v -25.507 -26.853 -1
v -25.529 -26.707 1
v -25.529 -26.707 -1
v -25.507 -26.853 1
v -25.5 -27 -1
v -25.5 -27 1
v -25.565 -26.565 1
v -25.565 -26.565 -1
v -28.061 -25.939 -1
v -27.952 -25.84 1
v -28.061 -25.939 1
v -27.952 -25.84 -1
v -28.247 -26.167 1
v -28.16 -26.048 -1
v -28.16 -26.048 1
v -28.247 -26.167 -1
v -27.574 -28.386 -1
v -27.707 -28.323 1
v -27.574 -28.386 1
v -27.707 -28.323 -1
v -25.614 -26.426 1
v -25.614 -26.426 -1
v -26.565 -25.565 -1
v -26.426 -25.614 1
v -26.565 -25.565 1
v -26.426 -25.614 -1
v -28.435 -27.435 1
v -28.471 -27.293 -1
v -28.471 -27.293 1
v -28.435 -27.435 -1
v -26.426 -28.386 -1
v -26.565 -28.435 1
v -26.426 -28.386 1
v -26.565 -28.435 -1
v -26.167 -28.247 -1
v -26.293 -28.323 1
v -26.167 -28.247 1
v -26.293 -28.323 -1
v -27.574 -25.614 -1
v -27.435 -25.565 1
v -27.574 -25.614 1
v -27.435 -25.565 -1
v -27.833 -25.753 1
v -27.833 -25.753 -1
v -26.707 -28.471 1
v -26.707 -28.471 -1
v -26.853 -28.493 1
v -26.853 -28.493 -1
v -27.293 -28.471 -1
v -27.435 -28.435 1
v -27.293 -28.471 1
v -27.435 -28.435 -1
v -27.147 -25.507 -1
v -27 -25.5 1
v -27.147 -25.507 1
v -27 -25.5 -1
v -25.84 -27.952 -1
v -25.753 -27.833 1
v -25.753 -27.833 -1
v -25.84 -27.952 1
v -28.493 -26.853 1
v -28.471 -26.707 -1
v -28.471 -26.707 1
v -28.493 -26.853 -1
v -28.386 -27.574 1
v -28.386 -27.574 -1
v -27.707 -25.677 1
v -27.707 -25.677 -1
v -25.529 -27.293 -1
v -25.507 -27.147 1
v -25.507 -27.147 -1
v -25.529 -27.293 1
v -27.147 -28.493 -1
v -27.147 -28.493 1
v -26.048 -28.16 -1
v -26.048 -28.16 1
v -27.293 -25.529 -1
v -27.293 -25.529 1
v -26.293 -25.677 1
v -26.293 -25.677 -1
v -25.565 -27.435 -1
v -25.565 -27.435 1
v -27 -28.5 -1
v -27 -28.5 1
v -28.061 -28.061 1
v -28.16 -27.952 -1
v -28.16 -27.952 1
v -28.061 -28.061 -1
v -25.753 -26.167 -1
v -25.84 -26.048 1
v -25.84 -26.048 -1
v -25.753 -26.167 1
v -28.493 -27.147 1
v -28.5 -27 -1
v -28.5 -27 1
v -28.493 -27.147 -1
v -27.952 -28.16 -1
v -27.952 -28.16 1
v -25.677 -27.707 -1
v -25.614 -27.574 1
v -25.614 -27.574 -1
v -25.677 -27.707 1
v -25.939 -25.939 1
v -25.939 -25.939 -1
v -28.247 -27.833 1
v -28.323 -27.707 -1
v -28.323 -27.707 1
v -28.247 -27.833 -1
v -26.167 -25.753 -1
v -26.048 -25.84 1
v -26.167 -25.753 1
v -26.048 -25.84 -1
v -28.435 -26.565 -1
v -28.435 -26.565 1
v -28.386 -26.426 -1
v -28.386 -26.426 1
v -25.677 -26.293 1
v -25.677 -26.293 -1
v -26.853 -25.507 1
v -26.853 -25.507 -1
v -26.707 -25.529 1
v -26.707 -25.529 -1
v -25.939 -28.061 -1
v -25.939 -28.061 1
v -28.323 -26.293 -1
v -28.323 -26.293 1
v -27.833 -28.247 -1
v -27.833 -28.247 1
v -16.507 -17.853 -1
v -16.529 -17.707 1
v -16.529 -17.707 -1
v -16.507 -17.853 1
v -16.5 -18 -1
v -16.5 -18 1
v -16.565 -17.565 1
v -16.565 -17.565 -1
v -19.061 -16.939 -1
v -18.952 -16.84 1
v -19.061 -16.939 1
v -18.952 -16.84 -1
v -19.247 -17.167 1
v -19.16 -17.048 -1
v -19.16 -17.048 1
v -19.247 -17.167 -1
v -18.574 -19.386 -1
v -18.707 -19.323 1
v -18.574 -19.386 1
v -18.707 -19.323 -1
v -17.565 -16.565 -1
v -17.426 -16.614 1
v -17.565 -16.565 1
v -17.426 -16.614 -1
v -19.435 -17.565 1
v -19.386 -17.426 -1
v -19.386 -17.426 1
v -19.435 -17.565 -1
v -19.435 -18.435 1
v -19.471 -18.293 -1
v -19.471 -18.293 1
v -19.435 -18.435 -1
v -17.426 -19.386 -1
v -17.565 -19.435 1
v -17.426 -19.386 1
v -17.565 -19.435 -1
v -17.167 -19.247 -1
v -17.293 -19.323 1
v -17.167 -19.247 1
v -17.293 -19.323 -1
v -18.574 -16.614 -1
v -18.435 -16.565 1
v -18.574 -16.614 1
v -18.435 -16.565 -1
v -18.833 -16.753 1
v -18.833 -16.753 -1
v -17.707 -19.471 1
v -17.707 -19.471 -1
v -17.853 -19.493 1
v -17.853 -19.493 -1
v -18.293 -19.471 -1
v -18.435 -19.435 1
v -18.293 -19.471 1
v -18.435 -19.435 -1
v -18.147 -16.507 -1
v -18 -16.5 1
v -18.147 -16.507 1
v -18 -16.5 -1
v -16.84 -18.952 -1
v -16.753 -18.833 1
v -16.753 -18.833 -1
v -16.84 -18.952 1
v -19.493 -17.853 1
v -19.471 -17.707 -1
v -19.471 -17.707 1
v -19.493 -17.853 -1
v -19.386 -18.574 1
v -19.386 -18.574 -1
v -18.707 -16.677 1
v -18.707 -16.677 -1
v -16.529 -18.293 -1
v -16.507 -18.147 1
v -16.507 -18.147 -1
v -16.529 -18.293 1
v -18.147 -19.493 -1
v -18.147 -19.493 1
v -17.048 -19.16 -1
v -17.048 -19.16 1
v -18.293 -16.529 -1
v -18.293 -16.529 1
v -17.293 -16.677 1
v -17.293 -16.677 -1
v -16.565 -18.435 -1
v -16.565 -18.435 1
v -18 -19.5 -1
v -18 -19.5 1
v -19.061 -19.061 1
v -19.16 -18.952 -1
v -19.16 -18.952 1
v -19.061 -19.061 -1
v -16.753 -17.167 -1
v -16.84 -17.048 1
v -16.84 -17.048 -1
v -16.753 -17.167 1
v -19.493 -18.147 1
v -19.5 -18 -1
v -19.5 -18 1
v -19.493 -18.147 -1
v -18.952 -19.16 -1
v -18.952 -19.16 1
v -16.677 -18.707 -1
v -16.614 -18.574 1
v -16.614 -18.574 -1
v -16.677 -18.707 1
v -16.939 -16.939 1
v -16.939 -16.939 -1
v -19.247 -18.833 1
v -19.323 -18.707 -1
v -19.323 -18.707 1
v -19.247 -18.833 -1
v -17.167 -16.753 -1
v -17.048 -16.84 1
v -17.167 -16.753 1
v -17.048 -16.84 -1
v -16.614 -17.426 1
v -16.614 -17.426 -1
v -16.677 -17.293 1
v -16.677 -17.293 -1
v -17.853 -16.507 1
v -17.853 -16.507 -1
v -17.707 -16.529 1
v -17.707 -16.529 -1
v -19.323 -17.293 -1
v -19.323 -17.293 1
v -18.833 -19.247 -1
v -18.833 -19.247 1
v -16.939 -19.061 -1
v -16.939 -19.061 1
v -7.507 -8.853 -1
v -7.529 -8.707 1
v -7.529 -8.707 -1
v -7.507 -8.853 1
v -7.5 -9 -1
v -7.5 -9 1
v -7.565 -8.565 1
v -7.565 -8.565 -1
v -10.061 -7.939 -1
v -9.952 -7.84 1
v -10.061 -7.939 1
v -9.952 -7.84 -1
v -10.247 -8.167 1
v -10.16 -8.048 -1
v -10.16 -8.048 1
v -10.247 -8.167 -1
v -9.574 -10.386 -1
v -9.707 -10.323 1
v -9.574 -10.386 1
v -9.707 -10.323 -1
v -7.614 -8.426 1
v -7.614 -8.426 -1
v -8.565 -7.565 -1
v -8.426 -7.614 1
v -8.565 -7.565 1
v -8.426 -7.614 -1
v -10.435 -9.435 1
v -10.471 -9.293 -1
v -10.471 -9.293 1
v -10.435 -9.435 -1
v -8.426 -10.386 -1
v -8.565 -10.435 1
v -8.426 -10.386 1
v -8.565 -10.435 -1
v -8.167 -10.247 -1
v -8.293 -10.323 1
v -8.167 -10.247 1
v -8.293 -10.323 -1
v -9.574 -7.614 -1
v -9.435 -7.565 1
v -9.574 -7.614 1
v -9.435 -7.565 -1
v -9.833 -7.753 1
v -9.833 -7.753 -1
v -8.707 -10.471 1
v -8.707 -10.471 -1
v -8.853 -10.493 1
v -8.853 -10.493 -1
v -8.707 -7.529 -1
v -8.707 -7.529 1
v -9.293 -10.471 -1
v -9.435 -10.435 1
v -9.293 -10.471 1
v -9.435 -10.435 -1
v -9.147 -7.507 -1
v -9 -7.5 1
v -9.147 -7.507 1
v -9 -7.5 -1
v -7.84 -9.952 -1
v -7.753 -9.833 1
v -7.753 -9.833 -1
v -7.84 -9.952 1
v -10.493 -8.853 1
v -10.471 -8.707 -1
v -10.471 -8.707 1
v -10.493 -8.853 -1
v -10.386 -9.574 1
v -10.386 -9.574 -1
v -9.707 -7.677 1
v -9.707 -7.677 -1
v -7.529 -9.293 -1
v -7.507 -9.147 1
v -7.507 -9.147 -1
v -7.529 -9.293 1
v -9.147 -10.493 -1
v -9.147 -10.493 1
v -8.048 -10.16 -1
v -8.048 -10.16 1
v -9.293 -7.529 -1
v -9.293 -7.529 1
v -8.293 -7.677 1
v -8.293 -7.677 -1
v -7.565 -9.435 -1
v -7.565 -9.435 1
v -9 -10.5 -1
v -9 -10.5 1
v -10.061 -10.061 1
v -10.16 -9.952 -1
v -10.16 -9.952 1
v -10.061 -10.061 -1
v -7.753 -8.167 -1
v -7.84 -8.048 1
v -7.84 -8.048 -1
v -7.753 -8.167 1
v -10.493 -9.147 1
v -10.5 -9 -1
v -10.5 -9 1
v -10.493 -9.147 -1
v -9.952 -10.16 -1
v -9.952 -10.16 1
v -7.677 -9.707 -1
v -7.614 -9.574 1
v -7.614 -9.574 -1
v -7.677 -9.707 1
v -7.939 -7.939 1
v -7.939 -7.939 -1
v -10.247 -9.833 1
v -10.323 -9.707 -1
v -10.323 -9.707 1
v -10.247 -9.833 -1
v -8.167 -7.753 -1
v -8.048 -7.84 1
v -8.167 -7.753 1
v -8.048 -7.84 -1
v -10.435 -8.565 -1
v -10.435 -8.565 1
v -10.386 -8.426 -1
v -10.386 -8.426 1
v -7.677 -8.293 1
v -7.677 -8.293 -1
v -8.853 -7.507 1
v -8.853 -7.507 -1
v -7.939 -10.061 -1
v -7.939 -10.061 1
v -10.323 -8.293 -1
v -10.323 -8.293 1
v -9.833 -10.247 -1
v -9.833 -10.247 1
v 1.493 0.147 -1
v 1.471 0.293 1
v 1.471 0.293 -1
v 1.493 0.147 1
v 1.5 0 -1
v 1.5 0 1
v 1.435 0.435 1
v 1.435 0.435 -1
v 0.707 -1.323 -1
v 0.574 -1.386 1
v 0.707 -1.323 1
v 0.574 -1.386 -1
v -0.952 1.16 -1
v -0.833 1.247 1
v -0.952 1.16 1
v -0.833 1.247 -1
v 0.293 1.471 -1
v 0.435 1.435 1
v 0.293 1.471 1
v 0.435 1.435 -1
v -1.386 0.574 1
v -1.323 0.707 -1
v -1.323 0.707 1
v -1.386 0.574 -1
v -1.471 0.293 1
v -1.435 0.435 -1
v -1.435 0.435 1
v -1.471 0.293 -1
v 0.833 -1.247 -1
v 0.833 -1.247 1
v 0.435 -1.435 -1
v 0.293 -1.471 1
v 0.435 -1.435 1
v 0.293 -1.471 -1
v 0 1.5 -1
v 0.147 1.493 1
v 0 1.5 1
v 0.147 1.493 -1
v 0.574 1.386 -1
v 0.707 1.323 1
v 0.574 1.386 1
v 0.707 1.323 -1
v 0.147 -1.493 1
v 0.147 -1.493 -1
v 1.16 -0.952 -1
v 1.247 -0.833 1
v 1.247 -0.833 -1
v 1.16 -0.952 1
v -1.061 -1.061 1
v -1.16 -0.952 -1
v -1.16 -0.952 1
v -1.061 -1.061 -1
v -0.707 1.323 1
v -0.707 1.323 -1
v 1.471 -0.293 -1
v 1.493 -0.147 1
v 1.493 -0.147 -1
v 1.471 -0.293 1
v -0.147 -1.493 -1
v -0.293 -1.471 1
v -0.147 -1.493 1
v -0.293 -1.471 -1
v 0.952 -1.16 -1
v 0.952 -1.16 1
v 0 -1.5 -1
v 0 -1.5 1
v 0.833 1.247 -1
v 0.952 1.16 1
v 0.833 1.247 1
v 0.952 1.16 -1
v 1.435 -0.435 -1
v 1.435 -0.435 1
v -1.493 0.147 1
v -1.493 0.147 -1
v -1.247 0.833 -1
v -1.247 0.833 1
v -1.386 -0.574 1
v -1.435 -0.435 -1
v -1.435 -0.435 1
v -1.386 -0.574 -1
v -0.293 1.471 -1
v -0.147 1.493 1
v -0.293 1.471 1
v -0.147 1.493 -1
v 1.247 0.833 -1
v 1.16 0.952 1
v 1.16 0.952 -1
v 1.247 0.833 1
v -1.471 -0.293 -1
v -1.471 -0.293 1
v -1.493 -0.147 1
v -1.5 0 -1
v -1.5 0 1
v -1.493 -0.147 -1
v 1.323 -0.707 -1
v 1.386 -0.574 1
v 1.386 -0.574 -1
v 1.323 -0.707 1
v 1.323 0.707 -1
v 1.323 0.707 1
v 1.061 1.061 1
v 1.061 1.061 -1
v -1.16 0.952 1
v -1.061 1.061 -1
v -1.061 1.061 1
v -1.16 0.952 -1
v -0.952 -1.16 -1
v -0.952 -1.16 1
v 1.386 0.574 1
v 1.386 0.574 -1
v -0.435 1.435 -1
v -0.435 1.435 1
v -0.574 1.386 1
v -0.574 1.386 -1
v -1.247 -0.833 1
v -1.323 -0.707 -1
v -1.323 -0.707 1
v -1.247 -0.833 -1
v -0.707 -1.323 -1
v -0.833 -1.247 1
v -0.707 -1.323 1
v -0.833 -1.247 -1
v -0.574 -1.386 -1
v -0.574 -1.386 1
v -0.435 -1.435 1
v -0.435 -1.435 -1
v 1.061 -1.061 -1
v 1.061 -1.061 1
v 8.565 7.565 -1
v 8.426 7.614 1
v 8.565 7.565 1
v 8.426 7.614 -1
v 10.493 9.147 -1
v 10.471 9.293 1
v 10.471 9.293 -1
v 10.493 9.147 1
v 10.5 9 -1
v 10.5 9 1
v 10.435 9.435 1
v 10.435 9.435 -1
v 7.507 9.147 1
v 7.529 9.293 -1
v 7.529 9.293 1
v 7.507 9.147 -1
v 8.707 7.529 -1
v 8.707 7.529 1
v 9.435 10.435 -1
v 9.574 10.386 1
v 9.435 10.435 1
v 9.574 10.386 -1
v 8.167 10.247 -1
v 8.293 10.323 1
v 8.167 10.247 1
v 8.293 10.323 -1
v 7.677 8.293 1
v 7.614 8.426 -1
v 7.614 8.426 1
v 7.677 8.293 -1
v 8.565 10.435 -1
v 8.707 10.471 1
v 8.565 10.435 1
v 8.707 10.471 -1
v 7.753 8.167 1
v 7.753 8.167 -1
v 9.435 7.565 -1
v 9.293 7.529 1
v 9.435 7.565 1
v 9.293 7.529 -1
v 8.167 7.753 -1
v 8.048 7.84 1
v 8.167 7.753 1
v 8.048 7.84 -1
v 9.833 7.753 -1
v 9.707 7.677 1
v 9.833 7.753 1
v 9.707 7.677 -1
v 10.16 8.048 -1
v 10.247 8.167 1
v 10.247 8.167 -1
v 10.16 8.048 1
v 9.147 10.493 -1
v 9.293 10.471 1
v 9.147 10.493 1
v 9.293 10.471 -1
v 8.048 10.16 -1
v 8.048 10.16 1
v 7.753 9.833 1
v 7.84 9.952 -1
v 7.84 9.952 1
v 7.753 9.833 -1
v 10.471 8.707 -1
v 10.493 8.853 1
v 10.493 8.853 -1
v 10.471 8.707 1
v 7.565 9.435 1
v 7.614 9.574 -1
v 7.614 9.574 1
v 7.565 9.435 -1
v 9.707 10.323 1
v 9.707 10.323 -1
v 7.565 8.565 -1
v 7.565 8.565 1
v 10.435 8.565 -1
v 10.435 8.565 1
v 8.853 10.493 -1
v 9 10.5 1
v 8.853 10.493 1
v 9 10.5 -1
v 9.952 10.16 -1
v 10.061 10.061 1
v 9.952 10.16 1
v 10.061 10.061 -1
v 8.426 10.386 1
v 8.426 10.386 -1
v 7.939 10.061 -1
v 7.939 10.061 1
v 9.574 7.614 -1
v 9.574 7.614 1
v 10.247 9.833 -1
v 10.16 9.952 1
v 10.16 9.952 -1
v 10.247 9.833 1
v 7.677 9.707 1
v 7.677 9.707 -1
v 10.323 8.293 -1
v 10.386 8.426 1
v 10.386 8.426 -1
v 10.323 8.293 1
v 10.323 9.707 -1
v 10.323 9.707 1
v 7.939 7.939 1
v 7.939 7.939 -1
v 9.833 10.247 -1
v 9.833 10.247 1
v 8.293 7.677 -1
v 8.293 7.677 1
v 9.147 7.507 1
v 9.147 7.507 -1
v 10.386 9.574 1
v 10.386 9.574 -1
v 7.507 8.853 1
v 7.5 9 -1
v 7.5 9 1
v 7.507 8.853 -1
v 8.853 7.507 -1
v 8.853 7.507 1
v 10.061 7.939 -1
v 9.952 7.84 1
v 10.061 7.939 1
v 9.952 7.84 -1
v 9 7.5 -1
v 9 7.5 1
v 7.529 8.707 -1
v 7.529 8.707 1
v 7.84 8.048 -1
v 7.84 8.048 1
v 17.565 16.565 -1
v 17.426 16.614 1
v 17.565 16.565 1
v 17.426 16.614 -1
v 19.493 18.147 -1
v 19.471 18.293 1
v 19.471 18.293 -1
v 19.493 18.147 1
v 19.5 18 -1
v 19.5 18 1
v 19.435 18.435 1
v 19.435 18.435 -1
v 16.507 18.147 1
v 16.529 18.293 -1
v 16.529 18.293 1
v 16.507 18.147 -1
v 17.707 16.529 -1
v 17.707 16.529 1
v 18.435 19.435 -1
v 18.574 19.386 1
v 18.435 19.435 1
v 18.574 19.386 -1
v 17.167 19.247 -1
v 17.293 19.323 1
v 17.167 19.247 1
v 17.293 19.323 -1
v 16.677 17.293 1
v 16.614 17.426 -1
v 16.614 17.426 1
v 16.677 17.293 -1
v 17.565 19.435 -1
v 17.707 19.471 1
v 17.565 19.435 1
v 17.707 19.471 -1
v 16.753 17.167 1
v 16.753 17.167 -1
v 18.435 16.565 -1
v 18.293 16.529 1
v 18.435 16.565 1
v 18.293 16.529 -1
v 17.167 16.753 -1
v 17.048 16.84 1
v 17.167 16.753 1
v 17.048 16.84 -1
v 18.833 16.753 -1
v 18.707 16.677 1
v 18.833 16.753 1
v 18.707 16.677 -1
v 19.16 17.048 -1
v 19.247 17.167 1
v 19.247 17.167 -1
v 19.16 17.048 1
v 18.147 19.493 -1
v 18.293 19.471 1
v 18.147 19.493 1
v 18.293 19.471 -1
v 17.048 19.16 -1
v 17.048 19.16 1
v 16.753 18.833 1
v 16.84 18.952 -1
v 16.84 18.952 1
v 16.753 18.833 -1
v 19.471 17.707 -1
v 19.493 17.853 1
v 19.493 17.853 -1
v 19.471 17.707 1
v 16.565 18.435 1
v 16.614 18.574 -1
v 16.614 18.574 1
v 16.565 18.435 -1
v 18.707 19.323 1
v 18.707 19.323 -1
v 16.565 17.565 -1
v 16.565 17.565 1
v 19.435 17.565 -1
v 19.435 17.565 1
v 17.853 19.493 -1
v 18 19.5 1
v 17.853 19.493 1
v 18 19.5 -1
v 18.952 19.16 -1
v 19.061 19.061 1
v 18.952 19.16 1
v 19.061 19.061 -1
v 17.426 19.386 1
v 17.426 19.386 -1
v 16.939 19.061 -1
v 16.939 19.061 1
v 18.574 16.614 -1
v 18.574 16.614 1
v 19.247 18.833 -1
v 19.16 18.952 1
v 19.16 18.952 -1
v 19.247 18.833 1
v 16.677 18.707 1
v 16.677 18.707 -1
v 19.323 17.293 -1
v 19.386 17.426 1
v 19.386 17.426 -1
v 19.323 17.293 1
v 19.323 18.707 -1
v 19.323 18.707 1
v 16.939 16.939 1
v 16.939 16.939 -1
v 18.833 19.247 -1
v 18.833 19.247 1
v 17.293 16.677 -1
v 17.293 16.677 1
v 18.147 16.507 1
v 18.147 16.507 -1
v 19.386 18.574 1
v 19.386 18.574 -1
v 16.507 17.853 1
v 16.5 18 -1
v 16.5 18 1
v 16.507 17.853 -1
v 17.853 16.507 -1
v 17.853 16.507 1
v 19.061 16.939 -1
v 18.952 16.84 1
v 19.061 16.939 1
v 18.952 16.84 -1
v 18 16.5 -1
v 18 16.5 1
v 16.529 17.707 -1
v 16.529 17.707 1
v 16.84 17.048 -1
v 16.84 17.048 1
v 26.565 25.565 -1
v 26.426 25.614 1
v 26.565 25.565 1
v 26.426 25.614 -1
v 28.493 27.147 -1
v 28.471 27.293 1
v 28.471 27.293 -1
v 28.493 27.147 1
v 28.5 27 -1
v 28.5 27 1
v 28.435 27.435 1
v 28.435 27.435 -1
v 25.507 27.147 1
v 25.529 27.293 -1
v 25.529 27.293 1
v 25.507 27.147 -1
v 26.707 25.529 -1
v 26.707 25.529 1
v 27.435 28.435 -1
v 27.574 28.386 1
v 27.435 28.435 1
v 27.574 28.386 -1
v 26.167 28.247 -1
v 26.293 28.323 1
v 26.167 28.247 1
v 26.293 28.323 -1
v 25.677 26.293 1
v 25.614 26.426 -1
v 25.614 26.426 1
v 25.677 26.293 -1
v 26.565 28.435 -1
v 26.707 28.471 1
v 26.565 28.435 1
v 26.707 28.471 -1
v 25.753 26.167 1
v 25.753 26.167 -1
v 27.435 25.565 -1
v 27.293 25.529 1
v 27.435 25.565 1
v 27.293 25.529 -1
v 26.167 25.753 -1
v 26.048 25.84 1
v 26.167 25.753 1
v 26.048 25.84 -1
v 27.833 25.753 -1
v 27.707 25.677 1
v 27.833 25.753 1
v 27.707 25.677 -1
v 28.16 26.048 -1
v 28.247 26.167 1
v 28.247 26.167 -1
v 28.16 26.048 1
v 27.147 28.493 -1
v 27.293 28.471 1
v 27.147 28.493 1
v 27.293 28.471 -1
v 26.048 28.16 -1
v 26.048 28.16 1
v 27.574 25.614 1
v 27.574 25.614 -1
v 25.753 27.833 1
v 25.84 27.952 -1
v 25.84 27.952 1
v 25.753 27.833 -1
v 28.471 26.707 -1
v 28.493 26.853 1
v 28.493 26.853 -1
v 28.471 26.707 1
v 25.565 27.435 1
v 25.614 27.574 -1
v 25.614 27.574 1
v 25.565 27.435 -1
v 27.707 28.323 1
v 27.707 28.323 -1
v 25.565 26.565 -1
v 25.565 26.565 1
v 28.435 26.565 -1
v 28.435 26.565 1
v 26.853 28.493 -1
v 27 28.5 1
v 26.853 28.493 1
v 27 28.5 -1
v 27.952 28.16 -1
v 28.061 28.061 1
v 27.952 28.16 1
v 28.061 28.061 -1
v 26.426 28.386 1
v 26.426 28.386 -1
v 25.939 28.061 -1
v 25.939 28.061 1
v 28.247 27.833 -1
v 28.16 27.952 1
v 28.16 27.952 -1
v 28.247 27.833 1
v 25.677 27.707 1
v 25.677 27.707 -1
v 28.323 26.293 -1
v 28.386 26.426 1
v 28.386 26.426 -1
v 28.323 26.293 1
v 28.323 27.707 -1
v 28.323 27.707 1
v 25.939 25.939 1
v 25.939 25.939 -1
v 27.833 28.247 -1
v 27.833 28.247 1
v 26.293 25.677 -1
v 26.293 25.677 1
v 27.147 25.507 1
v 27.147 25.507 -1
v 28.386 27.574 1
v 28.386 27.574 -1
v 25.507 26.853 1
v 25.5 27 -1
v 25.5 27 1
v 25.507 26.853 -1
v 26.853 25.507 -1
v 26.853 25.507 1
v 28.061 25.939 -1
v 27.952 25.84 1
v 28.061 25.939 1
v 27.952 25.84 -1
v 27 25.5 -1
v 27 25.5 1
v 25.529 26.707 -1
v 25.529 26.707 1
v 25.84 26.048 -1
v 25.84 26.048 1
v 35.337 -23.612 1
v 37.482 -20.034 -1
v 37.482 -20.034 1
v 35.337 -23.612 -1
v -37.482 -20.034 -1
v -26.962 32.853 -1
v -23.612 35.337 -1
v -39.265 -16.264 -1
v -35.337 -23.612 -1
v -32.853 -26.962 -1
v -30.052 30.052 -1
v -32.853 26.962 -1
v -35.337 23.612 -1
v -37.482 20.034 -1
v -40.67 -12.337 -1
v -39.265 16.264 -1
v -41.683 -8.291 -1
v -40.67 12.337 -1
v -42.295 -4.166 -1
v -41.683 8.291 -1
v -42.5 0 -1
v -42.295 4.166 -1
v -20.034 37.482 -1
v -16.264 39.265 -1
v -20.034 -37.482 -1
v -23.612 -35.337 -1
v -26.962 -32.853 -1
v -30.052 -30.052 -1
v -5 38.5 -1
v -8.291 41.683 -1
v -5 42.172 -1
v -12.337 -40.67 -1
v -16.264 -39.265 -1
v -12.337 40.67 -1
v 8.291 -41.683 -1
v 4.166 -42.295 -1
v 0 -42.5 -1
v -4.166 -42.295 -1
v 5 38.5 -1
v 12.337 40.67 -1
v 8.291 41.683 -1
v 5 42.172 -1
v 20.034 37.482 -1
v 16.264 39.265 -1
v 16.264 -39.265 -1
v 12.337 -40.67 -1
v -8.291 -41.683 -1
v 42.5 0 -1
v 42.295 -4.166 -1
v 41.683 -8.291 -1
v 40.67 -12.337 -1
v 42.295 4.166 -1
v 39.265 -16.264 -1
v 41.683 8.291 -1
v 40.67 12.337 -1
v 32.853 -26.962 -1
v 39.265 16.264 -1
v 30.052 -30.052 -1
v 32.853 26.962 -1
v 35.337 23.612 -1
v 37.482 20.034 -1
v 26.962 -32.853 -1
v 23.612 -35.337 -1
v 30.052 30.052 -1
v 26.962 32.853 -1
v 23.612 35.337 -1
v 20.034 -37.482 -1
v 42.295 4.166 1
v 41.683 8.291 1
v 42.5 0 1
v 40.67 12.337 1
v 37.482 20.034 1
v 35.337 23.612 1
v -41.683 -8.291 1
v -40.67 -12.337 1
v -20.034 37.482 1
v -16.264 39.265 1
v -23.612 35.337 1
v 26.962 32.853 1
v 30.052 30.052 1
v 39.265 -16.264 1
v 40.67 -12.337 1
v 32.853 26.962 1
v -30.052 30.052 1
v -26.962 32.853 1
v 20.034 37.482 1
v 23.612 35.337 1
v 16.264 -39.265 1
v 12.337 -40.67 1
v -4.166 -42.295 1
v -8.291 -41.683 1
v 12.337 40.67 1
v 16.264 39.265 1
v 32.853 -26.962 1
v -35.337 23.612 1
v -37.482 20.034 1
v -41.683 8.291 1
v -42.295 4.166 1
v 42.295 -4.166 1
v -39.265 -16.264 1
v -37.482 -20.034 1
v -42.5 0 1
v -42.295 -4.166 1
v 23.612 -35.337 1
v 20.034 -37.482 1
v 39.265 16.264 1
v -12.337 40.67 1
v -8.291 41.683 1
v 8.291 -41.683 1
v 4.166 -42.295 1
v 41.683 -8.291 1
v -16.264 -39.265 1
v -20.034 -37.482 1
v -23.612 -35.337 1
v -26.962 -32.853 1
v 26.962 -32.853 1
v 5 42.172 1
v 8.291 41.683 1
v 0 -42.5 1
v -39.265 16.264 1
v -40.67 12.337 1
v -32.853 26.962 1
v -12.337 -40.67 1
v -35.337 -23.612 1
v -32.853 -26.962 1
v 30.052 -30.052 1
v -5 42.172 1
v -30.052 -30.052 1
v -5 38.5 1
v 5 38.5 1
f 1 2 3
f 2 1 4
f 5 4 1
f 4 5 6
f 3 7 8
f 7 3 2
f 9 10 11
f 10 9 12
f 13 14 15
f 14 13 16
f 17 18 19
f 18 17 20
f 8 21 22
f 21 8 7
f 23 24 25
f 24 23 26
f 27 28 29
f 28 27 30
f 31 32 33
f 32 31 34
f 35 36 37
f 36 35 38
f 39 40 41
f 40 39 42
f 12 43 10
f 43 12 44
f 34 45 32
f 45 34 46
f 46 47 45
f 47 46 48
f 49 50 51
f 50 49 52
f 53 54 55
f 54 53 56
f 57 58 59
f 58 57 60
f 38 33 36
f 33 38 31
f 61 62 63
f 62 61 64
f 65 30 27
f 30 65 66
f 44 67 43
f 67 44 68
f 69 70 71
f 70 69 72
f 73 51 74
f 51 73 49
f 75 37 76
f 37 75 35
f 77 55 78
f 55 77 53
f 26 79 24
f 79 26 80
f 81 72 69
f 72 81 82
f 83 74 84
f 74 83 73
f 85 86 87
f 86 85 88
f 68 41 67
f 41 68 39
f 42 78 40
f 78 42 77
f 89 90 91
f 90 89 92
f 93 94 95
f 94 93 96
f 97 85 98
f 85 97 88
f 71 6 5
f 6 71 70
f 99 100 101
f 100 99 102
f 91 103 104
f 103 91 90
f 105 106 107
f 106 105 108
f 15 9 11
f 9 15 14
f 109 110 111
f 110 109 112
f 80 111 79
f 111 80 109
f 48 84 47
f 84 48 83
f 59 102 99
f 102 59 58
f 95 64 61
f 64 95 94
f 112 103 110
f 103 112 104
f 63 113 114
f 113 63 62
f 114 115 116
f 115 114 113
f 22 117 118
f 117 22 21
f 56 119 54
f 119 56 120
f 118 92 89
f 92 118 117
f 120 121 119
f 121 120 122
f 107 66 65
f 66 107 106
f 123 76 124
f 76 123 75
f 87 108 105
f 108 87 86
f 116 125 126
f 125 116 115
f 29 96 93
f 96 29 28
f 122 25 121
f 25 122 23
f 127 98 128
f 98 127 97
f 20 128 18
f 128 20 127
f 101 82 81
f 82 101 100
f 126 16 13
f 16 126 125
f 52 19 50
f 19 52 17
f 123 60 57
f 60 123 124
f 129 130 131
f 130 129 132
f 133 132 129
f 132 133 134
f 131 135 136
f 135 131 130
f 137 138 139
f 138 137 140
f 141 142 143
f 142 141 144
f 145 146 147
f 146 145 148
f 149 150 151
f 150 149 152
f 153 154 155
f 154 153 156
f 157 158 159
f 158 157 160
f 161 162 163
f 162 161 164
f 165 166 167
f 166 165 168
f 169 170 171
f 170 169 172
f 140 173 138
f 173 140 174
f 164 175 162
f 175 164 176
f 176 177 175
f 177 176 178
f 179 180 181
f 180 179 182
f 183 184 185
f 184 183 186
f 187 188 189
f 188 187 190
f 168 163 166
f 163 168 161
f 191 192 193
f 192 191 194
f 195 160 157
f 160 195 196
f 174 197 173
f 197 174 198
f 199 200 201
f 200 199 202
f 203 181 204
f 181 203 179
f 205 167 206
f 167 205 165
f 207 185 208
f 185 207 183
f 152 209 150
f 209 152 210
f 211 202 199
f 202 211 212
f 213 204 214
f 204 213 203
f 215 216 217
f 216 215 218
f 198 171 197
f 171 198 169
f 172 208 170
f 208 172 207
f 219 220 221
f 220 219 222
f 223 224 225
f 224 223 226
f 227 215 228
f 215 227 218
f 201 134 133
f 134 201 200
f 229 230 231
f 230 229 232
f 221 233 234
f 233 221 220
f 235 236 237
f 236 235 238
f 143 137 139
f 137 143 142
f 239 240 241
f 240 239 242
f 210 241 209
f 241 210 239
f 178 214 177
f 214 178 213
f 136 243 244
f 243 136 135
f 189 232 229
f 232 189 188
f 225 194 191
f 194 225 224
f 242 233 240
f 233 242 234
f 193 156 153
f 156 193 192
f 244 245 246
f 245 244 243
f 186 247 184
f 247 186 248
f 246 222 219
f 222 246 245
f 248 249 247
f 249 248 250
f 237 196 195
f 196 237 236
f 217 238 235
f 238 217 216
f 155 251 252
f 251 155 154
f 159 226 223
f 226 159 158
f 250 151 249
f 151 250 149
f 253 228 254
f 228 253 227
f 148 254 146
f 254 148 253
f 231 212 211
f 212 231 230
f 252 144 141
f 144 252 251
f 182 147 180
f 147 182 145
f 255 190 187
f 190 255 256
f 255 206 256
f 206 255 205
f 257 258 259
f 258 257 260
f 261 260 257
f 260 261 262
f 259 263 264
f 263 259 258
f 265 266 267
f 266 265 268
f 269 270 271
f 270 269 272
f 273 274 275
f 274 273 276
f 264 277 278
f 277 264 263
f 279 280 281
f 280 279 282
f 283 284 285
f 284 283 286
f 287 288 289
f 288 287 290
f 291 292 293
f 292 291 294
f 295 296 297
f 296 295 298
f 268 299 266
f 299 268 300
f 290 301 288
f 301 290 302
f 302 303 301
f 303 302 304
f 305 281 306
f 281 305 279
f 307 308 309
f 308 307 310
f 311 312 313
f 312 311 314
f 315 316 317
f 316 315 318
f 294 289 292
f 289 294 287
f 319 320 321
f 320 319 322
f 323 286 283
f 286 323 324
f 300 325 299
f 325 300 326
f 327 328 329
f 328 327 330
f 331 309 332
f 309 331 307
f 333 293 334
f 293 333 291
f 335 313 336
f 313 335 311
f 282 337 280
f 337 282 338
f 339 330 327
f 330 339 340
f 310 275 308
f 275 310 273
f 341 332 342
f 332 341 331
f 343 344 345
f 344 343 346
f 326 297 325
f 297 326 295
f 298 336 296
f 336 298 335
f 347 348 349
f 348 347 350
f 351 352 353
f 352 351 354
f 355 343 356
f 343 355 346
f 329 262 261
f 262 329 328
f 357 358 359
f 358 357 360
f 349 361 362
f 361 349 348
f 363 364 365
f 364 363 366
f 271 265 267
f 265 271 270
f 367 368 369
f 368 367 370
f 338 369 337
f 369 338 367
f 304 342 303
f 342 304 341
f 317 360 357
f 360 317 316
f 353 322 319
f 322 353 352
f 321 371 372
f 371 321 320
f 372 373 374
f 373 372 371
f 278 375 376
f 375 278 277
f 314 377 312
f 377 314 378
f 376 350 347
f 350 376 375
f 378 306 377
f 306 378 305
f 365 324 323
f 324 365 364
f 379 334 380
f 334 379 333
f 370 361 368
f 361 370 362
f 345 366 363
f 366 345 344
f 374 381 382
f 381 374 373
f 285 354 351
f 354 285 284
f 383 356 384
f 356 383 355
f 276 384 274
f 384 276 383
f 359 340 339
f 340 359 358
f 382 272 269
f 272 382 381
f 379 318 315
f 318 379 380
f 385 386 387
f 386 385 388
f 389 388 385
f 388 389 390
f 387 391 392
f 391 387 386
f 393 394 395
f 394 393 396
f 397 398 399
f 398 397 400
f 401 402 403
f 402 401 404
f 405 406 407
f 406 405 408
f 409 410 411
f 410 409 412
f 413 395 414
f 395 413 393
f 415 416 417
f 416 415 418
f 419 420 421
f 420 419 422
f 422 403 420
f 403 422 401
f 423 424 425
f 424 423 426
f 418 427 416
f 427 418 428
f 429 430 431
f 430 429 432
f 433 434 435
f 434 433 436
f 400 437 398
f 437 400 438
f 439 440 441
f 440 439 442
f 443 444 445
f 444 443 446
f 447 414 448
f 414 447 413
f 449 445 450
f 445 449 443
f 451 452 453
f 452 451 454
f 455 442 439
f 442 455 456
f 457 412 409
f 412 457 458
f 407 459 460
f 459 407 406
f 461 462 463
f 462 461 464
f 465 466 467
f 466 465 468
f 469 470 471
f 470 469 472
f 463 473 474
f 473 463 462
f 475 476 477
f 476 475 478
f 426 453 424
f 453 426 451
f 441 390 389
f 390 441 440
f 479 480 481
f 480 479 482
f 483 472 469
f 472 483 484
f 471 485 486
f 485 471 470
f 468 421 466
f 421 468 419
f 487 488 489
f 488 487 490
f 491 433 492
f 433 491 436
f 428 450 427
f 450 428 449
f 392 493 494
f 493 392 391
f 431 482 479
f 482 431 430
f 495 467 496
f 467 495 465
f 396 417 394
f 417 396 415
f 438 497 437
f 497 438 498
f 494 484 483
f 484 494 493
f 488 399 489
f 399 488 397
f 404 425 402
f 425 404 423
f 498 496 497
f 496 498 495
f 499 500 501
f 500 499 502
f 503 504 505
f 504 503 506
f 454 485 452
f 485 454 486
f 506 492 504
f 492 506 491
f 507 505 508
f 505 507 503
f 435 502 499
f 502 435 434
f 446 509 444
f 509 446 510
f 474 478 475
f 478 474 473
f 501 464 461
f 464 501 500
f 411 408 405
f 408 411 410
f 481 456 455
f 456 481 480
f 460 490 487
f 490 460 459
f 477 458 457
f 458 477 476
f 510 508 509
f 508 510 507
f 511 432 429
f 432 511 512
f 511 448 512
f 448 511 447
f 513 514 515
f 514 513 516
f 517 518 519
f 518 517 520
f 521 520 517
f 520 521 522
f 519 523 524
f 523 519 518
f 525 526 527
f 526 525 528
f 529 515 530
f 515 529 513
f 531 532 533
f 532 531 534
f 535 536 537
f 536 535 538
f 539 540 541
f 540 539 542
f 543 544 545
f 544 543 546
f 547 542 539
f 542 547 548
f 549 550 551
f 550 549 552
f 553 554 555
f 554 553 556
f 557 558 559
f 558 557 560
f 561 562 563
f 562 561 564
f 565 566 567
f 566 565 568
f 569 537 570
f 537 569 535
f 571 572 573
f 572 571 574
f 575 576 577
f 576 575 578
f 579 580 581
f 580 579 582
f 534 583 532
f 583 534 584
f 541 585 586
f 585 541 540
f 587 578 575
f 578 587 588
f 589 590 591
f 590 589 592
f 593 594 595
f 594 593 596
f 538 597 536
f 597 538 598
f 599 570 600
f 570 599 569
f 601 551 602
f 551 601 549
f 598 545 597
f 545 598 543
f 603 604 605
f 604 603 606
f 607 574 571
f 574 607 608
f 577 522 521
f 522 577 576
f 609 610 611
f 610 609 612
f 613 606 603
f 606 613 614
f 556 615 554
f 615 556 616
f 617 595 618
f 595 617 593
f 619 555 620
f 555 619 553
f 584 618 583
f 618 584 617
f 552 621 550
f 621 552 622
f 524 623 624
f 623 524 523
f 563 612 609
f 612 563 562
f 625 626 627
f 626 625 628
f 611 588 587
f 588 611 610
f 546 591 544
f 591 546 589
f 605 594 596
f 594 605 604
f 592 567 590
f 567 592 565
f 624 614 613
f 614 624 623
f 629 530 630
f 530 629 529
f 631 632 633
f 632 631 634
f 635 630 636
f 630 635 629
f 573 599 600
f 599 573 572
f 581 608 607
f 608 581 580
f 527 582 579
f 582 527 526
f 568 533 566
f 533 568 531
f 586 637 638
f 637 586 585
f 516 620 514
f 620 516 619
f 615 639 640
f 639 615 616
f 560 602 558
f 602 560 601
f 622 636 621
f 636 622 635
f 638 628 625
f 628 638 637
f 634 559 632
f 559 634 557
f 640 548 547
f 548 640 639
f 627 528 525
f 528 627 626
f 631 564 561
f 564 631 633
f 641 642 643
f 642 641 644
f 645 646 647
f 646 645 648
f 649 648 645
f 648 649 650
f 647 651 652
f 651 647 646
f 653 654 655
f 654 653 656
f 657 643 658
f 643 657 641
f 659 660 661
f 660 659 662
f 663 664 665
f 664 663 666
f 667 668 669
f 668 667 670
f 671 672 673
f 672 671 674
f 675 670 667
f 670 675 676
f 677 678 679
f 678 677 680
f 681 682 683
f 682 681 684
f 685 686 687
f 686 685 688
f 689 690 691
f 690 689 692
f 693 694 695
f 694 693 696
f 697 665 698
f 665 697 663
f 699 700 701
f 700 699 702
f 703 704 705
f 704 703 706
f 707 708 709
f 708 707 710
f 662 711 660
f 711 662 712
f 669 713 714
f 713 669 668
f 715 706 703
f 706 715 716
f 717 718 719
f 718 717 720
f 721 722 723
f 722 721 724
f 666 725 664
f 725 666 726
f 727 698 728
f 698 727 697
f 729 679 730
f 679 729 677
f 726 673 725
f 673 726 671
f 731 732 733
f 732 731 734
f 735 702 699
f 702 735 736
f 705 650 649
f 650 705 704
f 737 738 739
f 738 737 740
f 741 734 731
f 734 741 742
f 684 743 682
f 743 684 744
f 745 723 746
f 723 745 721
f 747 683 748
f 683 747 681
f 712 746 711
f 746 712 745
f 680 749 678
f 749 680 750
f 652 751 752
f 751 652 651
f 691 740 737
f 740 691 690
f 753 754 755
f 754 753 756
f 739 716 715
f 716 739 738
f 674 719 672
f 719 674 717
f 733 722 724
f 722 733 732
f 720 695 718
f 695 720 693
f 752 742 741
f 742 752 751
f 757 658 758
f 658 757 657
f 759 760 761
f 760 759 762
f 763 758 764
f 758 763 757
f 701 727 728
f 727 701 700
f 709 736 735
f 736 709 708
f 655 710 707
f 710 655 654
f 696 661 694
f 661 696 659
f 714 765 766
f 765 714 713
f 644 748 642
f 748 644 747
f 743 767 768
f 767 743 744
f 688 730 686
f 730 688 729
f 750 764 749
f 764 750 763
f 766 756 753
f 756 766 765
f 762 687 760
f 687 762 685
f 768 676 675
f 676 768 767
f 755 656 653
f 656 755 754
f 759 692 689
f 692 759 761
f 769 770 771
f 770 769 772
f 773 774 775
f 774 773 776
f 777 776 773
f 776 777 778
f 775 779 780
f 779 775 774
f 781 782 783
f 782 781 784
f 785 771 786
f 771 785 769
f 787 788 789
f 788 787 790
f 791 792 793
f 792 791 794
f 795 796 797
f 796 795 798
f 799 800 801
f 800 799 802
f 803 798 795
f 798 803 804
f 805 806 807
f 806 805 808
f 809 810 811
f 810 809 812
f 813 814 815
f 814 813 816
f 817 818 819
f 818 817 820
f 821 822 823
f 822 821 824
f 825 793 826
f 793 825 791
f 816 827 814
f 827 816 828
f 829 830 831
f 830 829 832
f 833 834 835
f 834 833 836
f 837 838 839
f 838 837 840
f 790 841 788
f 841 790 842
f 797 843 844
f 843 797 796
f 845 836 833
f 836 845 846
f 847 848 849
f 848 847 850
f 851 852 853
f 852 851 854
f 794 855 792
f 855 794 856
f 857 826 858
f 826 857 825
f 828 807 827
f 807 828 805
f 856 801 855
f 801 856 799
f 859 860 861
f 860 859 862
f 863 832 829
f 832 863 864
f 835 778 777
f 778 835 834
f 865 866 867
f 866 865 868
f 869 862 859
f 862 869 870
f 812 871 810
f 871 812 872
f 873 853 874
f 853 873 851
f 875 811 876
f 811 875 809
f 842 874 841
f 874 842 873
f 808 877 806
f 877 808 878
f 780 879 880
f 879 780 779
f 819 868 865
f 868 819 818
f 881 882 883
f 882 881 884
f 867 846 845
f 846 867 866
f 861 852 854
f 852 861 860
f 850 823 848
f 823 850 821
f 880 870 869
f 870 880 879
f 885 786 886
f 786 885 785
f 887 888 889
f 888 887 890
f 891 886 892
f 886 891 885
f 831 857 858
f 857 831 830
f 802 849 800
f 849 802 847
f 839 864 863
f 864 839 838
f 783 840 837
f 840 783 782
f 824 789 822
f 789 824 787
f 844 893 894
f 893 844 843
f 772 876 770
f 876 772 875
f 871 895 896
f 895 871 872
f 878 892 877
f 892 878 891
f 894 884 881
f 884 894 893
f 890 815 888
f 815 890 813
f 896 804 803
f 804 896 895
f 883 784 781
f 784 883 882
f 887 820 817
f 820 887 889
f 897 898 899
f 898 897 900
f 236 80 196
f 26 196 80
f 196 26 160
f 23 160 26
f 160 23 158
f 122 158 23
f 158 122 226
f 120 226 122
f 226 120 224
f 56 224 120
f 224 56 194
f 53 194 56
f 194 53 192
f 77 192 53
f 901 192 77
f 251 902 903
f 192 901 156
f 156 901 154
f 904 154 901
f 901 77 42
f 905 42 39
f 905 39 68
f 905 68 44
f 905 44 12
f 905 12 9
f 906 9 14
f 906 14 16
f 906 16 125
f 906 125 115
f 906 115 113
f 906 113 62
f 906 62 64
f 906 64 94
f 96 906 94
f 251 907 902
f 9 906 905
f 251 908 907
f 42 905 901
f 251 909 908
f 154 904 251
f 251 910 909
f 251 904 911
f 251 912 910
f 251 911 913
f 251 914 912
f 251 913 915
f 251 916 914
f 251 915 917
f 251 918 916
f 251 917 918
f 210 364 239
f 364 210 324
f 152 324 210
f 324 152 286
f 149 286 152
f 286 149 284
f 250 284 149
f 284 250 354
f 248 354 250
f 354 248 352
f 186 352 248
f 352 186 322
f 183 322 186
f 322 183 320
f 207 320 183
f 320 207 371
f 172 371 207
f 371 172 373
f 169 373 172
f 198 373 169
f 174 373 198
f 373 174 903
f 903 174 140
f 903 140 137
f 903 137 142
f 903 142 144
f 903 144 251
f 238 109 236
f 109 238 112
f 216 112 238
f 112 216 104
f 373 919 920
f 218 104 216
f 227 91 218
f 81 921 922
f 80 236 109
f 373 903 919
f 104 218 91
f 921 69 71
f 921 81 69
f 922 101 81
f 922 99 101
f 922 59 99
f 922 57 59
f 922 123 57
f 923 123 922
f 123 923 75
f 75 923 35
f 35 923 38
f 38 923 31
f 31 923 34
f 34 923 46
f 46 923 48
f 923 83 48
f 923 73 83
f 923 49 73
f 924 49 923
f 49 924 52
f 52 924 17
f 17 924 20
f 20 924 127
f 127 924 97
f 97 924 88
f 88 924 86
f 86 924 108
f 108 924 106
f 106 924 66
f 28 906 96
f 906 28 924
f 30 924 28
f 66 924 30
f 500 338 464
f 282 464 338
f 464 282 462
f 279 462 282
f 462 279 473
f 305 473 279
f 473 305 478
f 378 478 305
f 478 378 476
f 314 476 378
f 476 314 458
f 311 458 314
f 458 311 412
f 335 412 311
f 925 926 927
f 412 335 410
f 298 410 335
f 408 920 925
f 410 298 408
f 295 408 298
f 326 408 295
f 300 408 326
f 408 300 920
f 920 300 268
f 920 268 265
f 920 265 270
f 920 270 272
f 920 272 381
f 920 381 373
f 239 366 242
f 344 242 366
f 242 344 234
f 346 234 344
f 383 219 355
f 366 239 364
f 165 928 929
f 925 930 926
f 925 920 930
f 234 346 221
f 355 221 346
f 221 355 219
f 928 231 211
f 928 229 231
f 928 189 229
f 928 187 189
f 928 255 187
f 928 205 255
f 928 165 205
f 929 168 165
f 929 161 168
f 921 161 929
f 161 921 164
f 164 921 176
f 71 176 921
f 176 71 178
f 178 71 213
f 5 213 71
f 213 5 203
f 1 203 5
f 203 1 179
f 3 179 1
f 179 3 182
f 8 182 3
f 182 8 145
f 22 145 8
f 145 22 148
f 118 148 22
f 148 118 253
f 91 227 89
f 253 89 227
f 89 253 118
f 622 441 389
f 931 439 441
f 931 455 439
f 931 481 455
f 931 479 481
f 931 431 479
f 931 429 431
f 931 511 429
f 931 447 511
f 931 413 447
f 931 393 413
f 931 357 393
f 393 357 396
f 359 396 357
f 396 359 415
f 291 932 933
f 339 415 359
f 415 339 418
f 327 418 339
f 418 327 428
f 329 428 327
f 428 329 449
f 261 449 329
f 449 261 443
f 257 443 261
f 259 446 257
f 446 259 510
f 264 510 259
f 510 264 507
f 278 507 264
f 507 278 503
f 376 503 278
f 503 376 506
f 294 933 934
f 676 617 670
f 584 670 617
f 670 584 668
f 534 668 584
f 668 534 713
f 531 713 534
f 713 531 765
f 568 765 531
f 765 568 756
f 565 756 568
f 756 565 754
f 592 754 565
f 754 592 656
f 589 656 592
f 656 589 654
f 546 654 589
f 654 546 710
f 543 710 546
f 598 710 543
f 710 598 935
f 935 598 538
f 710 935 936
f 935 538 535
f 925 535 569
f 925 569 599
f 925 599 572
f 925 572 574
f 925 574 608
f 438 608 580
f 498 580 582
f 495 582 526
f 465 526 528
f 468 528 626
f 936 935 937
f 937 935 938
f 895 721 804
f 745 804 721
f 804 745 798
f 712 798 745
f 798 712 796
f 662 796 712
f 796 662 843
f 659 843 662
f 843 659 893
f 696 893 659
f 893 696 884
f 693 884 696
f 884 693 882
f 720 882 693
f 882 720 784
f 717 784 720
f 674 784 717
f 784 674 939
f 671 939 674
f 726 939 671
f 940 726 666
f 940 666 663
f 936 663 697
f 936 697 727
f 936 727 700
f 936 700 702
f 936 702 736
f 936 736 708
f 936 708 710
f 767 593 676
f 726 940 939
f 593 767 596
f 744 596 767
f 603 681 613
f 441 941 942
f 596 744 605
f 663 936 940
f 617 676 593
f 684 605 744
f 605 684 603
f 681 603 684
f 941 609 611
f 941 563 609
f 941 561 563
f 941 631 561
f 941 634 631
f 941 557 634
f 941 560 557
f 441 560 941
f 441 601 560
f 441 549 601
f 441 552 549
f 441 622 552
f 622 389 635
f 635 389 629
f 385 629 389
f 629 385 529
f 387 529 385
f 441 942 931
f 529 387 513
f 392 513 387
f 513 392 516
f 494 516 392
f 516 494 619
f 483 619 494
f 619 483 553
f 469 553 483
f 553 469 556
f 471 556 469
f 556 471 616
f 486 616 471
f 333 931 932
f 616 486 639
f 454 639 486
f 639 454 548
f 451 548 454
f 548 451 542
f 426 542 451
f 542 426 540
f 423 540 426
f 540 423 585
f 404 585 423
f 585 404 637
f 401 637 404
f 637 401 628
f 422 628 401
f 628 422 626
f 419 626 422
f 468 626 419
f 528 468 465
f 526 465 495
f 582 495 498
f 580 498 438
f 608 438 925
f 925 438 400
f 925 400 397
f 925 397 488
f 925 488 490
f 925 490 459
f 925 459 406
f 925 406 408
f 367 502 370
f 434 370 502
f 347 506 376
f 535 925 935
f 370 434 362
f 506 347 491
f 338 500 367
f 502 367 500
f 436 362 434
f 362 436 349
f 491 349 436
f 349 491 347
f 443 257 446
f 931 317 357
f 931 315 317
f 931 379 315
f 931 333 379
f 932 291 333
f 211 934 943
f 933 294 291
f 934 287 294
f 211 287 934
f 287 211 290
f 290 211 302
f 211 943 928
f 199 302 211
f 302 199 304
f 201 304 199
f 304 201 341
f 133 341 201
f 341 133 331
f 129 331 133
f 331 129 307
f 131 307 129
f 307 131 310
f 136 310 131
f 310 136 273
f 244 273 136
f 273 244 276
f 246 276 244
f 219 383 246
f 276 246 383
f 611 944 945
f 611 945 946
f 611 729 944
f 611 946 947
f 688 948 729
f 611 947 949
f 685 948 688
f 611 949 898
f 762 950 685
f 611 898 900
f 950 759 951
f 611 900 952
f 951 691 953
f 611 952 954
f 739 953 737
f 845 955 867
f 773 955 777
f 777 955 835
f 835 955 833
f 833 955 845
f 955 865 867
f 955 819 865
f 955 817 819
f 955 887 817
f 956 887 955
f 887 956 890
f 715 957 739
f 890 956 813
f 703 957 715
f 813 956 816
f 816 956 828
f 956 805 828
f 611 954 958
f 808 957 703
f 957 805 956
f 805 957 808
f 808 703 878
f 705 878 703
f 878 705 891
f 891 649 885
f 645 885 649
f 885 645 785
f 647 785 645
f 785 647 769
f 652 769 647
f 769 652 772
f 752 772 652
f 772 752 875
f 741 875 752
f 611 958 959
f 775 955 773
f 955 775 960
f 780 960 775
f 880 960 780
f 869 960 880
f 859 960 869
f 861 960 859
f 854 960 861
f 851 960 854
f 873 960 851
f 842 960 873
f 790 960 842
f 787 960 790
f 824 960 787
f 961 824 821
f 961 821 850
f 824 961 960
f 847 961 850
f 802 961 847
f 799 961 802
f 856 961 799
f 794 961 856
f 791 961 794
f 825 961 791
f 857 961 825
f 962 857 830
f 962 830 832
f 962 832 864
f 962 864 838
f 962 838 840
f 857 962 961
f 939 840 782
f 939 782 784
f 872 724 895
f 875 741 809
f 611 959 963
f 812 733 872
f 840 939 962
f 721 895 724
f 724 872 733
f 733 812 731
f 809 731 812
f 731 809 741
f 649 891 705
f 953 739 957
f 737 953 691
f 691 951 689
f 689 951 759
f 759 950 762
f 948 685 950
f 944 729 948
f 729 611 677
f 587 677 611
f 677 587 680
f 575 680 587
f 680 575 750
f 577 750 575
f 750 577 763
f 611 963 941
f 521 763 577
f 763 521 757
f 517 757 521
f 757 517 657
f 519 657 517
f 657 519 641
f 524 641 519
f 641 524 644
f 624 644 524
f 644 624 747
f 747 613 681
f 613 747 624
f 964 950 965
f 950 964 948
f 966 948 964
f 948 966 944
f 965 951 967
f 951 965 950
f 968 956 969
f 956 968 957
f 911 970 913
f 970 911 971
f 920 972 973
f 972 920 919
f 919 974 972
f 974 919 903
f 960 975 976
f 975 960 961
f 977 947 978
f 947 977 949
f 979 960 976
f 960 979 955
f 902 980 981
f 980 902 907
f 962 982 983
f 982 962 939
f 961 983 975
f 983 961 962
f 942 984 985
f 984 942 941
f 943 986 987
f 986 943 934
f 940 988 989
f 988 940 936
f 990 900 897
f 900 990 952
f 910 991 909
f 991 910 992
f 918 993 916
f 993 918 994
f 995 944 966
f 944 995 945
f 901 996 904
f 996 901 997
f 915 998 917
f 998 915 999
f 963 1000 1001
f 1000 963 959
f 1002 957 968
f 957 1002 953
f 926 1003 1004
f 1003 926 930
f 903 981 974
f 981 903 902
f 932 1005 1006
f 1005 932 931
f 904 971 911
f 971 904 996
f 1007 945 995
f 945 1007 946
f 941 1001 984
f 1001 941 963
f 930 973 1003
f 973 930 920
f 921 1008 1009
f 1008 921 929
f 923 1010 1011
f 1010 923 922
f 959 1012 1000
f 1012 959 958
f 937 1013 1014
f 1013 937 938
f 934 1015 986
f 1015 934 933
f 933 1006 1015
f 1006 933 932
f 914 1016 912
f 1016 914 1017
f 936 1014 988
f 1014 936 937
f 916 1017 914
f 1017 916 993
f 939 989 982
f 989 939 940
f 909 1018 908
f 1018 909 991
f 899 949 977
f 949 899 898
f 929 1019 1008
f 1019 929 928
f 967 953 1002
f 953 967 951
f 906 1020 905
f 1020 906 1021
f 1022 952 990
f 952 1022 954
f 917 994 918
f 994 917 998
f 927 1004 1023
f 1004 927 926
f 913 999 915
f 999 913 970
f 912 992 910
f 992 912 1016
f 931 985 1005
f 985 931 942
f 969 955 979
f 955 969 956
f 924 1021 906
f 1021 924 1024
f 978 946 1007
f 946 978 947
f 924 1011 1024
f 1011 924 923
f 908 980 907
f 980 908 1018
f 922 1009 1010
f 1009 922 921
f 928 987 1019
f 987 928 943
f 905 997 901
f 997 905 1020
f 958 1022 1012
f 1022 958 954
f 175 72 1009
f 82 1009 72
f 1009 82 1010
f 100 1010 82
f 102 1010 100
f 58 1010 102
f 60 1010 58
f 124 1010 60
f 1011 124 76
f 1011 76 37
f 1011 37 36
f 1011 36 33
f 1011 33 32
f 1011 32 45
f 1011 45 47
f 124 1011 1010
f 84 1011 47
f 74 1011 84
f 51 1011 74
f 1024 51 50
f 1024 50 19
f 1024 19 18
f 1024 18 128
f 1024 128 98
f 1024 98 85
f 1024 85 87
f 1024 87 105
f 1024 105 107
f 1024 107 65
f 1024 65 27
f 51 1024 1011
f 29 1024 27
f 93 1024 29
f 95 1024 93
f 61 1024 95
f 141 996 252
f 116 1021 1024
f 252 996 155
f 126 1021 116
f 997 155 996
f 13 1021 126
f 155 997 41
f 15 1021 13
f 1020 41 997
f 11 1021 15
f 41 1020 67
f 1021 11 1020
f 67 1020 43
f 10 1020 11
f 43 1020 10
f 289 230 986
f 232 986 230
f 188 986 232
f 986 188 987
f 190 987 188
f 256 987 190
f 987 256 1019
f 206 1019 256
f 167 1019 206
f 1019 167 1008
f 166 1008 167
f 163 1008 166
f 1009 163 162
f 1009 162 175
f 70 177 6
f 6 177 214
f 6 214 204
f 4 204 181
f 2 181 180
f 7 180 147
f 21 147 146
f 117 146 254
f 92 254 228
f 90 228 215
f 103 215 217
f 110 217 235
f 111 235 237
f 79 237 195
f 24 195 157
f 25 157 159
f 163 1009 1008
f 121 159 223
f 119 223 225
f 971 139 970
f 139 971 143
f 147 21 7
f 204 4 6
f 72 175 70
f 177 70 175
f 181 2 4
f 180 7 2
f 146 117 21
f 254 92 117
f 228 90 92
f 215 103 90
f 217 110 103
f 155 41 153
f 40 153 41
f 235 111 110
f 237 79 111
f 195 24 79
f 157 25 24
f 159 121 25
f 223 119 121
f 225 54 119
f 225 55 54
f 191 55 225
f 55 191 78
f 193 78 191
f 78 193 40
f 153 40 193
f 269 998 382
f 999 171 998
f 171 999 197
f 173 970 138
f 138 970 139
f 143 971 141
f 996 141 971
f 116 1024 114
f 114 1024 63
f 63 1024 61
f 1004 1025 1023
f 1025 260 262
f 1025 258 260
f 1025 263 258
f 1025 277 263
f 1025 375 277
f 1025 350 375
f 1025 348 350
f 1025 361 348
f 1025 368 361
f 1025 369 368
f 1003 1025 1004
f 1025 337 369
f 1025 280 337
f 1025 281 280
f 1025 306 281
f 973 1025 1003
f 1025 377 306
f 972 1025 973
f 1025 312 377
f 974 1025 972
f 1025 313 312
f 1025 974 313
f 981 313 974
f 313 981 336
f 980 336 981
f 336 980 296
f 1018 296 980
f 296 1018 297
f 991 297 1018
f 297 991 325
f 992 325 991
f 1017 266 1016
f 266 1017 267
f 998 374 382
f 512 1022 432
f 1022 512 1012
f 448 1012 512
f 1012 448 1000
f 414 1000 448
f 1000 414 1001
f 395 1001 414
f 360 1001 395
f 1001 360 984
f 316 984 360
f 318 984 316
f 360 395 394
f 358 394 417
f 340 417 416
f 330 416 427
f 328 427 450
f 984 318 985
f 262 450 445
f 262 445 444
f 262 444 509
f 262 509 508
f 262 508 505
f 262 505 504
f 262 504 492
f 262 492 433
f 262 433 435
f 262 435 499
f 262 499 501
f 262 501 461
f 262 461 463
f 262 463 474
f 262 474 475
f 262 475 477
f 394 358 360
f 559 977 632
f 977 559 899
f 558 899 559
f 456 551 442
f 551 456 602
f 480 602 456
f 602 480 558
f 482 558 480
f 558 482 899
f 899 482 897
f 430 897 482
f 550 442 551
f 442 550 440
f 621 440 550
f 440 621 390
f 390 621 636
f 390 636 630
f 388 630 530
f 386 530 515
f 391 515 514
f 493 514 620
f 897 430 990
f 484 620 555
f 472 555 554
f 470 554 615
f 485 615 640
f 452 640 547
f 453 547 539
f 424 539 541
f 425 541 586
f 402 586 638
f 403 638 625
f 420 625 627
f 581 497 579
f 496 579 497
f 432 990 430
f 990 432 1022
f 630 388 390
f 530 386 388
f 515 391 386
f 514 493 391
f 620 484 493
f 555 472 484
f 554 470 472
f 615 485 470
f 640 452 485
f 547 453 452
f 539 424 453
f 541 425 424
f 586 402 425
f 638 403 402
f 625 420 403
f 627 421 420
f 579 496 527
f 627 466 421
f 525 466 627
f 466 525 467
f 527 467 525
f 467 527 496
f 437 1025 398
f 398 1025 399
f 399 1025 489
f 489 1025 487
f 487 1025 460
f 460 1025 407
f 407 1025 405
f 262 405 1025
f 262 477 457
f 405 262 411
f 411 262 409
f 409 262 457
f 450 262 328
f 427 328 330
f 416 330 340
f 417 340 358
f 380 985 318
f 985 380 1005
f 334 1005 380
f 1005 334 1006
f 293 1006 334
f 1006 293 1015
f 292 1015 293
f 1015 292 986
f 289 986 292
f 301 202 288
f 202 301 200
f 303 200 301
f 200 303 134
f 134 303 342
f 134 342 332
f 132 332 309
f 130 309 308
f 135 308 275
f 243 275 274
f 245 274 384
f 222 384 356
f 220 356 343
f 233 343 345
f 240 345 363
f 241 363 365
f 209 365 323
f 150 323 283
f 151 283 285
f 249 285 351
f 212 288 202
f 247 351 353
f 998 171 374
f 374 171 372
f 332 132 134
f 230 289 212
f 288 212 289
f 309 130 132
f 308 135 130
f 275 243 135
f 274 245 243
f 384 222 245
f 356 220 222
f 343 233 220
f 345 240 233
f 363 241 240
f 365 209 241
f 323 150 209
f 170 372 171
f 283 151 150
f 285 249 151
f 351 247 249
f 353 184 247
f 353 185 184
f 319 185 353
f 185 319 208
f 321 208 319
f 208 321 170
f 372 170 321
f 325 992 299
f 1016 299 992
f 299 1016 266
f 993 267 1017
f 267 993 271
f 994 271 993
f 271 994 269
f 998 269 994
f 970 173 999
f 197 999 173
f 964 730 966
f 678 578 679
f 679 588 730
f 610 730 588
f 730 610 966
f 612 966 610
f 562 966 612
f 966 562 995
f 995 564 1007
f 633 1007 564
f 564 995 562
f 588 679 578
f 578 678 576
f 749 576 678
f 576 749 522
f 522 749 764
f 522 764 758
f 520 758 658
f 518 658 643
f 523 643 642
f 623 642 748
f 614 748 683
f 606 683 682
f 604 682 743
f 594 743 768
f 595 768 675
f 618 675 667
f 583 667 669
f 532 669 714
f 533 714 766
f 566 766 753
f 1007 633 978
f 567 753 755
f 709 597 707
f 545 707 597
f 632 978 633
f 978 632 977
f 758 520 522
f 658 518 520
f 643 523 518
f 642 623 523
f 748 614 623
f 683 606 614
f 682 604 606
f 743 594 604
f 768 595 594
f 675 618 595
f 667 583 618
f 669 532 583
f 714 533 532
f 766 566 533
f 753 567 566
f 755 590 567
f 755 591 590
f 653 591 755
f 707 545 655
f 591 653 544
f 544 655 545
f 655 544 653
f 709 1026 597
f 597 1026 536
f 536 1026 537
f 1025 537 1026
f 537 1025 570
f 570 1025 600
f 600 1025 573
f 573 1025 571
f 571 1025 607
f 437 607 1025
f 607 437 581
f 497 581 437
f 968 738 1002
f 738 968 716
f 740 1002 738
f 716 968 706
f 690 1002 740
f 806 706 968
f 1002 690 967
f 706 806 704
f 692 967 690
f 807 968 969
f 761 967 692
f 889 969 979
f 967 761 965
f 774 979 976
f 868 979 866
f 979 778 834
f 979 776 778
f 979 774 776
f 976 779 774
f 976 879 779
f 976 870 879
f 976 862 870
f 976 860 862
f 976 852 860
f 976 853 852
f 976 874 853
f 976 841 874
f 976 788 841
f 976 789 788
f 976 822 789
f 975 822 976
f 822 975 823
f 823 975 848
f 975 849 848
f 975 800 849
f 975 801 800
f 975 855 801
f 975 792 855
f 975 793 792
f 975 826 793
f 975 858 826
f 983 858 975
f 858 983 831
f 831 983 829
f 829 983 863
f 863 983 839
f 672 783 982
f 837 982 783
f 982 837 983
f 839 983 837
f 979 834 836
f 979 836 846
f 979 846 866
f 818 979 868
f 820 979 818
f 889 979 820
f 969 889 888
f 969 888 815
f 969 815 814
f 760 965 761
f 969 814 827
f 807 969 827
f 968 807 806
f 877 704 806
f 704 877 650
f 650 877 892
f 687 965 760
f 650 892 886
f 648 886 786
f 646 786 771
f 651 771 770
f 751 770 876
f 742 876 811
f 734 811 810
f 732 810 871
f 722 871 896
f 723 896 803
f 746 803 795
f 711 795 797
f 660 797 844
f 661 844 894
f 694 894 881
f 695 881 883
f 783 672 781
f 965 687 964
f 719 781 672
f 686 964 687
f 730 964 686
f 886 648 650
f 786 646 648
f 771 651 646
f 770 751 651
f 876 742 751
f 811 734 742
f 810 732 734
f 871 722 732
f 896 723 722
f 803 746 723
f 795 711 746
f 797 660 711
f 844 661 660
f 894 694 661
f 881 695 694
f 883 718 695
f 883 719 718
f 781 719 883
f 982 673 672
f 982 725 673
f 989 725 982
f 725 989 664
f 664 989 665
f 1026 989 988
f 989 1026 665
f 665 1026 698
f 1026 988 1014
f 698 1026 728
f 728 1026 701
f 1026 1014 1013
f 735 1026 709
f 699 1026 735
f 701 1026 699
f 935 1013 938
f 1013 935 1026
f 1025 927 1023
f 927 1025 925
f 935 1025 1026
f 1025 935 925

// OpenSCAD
$fn = 64;

// Dimensions
dish_diameter = 90;      // Context: 90 mm Petri dish
part_diameter = 85;      // 85 mm diameter
part_thickness = 2;      // 2 mm thick
hole_diameter = 3;       // 3 mm diameter
hole_spacing = 9;        // 9 mm centre-to-centre
grid_size = 7;           // 7 x 7 grid
notch_width = 10;        // 10 mm wide (X)
notch_depth = 4;         // 4 mm deep (Y, measured in from the rim)

// Geometry
difference() {
    // Base Disc
    cylinder(r = part_diameter / 2, h = part_thickness, center = true);

    // Holes
    // Calculate offset to center the grid
    grid_span = (grid_size - 1) * hole_spacing;
    offset = grid_span / 2;

    for (i = [0 : grid_size - 1]) {
        x = -offset + (i * hole_spacing);
        y = -offset + (i * hole_spacing);
        // Extend 0.01mm past faces to ensure clean cut
        translate([x, y, 0])
            cylinder(h = part_thickness + 0.01, r = hole_diameter / 2, center = true);
    }

    // Notch
    // Located on +Y side of the rim (Y = part_diameter/2)
    // 4mm deep means it goes from Y = 42.5 down to Y = 38.5
    // Centered on the rim line: Y = 42.5 - 2 = 40.5
    translate([0, part_diameter / 2 - 2, 0])
        cube([notch_width, notch_depth, part_thickness + 0.01], center = true);
}
